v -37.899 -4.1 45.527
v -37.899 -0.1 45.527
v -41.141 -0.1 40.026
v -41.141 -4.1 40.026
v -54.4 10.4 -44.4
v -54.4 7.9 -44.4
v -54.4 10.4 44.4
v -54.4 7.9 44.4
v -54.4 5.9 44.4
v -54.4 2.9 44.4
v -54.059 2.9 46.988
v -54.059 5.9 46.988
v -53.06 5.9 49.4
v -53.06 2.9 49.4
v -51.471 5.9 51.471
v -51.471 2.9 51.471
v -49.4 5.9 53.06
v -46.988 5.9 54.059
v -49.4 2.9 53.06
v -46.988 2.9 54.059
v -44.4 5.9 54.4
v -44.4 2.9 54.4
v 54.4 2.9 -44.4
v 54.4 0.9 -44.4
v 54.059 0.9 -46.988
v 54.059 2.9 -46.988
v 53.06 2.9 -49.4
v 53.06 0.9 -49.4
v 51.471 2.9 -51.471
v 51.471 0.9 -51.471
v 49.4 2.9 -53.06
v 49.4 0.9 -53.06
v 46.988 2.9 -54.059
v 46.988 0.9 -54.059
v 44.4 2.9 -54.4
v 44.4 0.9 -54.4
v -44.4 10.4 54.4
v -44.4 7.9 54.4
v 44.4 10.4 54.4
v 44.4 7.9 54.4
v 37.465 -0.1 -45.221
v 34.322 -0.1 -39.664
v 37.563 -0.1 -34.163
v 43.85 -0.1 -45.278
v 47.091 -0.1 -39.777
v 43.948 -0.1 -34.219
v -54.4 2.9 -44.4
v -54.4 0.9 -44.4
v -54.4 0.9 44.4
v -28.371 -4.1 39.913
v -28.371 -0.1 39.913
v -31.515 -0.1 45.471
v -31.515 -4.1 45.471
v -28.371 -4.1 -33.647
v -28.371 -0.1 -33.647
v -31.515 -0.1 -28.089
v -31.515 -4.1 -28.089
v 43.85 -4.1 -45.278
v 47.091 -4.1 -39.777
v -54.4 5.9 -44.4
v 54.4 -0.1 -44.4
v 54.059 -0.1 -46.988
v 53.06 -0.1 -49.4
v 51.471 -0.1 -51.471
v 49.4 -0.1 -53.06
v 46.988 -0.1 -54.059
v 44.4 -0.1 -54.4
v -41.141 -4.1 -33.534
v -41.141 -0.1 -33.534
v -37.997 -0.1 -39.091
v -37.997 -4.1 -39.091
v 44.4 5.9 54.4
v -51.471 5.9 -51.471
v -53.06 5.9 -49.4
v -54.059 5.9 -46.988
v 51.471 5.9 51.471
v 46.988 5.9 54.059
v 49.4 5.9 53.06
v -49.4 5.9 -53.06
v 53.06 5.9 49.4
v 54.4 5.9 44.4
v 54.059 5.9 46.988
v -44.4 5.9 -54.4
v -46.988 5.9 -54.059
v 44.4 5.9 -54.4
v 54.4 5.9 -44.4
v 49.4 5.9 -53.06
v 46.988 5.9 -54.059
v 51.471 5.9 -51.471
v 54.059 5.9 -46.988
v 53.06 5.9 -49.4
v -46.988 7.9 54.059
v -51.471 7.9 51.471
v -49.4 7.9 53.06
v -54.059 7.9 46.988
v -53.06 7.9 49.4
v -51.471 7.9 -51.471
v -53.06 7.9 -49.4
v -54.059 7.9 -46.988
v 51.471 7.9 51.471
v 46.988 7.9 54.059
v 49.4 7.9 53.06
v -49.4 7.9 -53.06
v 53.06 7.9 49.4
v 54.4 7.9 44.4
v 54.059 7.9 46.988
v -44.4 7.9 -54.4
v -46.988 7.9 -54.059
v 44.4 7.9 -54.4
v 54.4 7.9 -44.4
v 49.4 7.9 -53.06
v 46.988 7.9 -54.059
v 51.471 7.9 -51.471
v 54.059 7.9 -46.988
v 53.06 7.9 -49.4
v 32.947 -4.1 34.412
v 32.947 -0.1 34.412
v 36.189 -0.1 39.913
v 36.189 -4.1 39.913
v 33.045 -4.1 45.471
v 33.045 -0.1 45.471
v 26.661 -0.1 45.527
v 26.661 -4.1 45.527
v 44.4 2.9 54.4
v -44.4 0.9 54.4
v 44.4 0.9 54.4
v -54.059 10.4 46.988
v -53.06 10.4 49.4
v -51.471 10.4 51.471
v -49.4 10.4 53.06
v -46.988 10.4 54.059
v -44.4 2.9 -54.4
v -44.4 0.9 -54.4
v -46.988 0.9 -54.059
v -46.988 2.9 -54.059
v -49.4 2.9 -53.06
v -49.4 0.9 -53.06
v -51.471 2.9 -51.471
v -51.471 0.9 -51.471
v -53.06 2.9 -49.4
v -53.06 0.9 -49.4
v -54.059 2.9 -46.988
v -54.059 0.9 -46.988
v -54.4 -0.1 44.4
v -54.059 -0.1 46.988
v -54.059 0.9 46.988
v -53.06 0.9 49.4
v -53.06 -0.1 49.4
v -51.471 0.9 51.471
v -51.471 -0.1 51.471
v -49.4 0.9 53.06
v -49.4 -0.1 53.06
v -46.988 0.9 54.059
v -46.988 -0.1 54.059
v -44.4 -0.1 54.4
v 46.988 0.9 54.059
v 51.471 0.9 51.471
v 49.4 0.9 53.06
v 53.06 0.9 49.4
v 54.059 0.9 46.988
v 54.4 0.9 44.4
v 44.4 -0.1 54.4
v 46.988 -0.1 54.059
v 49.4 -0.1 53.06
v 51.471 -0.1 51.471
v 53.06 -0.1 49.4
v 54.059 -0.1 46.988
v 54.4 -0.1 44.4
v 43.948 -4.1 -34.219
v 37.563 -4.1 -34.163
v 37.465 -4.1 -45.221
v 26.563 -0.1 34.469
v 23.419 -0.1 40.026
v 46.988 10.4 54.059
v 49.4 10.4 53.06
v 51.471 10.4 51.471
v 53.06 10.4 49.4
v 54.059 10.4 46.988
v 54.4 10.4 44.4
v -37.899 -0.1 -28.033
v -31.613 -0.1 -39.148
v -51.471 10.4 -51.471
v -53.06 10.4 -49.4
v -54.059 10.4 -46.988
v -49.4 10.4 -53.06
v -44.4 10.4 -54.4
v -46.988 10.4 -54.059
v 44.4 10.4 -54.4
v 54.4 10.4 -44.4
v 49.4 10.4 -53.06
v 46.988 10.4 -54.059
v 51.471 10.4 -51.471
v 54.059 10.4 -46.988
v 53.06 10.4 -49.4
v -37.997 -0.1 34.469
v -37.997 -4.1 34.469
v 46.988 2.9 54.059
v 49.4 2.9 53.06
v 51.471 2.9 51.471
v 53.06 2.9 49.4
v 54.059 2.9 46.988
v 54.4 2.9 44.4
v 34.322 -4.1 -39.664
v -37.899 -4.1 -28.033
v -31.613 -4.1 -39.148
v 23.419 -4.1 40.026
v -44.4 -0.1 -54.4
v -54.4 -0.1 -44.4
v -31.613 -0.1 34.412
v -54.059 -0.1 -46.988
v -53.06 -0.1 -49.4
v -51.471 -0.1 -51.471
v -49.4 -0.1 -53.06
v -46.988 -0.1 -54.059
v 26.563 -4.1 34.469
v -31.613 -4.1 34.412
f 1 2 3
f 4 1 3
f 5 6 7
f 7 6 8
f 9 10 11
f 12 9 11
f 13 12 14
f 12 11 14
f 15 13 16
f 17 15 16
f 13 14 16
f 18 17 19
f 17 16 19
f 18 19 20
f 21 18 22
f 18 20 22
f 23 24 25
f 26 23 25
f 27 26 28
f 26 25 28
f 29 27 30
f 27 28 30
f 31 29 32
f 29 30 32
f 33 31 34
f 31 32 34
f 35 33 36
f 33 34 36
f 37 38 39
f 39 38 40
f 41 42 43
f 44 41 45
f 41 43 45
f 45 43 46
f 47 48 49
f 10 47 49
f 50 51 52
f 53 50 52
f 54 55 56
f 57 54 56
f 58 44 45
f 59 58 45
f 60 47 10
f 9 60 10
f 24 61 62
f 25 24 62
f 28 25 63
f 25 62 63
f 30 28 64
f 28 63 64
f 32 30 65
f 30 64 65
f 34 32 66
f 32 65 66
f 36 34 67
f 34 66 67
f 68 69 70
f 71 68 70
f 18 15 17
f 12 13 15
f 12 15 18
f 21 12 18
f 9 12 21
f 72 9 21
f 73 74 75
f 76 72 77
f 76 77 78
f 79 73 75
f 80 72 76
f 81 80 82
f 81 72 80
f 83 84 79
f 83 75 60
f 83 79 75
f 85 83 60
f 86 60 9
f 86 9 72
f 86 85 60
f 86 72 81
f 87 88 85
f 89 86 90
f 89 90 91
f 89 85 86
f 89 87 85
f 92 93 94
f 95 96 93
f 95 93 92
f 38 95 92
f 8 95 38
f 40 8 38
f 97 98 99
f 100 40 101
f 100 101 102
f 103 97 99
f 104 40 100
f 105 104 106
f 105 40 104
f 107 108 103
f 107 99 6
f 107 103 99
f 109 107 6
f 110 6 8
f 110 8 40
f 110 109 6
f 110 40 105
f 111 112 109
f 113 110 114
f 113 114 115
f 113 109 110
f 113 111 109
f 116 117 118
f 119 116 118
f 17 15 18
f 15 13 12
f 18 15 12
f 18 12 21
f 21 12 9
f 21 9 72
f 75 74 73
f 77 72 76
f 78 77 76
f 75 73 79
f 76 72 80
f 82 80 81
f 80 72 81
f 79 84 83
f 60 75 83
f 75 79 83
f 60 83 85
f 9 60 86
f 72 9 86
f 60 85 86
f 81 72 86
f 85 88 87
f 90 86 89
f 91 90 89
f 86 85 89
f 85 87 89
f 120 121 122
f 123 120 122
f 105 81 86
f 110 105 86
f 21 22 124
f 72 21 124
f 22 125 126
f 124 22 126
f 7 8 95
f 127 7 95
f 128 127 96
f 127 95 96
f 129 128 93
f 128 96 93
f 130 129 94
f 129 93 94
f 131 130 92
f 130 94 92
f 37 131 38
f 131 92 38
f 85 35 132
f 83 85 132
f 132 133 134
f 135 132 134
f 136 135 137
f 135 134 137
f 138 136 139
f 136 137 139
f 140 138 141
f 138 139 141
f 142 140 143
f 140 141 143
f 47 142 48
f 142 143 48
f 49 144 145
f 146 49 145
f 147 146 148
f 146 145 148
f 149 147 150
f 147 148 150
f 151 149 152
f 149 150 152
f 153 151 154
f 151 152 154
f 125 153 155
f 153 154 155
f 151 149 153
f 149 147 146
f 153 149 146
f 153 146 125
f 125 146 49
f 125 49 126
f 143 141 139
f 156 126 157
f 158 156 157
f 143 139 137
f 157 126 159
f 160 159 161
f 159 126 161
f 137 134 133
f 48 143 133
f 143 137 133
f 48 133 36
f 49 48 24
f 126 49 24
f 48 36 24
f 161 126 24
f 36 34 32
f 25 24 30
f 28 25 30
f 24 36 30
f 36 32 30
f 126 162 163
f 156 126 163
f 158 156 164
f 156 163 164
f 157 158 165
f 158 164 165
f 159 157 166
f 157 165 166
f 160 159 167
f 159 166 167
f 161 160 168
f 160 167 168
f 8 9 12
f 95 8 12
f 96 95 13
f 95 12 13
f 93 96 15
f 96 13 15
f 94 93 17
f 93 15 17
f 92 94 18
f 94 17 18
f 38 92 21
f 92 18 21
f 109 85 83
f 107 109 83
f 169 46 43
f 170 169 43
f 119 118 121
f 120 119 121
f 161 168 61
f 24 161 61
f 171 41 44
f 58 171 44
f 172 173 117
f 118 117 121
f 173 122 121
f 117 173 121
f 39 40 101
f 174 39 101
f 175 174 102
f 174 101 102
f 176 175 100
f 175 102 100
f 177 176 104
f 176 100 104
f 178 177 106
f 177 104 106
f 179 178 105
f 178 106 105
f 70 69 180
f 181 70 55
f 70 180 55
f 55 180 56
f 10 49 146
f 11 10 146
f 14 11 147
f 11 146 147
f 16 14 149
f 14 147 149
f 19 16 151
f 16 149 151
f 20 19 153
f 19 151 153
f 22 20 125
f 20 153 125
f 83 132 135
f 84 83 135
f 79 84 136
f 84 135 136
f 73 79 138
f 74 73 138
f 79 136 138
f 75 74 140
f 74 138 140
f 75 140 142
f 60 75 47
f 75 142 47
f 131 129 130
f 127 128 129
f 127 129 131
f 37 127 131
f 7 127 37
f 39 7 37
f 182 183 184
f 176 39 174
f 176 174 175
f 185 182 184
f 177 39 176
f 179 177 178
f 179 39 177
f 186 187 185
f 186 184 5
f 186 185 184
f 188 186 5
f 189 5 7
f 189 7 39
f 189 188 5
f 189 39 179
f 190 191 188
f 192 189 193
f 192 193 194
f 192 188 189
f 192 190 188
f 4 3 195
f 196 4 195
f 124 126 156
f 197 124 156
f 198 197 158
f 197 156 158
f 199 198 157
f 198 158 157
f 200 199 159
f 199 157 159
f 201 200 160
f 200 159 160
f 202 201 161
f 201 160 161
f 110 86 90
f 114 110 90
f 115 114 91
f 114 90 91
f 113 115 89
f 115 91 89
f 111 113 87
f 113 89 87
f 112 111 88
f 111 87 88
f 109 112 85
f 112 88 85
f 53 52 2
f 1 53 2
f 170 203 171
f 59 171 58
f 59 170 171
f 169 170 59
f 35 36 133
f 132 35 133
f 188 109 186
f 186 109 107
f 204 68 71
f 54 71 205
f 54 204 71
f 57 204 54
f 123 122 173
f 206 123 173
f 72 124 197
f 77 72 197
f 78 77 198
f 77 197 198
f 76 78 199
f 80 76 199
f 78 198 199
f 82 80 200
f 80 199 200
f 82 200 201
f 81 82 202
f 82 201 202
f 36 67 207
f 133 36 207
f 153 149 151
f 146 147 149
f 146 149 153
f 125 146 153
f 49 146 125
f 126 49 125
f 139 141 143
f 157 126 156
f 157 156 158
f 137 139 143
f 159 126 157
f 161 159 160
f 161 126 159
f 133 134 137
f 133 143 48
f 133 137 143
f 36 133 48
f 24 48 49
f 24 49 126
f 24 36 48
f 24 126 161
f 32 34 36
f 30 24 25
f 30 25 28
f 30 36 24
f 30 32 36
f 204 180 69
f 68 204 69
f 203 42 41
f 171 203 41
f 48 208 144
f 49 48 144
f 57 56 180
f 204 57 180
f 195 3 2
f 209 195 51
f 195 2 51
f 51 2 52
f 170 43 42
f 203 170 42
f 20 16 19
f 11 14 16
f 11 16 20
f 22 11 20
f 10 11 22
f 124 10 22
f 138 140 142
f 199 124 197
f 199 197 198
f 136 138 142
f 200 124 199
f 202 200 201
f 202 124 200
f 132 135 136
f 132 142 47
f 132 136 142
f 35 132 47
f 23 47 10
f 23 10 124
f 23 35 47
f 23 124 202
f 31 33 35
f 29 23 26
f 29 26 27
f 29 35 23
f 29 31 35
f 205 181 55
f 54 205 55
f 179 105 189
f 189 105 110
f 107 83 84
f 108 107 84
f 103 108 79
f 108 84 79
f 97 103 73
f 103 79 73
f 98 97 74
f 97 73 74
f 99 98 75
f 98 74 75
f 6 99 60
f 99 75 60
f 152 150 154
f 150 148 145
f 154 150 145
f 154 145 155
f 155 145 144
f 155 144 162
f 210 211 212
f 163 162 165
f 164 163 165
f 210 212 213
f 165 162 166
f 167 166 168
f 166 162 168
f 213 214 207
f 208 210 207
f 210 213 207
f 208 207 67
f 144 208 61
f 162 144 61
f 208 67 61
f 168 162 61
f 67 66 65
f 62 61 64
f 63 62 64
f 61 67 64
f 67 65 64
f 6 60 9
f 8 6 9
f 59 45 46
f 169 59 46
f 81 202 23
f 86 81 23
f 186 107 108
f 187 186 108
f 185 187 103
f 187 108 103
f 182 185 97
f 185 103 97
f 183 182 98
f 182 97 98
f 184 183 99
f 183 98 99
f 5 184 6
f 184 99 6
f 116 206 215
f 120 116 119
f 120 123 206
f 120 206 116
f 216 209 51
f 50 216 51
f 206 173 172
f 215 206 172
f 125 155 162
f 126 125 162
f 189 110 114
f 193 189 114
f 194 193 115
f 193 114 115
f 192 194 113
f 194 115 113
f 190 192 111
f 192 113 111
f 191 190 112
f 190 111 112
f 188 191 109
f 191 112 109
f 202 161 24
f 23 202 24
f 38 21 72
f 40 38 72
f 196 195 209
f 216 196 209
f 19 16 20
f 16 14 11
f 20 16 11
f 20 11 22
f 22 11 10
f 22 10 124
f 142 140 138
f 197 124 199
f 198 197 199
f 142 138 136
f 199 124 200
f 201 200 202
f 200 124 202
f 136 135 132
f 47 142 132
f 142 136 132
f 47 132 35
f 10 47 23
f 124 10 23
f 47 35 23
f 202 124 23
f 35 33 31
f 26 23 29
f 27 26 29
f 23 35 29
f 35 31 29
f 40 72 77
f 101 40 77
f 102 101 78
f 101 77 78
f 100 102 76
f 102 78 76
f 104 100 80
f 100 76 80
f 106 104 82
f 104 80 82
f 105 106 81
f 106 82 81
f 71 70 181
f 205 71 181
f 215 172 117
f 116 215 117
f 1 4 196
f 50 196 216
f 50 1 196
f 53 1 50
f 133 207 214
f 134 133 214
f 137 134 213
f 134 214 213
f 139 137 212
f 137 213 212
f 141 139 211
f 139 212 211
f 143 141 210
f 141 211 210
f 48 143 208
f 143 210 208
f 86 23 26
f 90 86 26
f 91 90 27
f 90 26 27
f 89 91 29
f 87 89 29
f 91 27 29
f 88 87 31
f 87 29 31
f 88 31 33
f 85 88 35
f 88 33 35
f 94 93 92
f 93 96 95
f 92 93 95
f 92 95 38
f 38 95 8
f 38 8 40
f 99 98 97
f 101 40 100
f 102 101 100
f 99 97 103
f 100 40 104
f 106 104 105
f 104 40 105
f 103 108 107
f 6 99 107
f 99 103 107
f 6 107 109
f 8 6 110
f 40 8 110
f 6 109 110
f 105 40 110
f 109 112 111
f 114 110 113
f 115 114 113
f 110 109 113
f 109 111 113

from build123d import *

# Parameters (mm, degrees)
BOSS_EXTRUDE1_DEPTH   = 0.1
BOSS_EXTRUDE2_START   = -0.1
BOSS_EXTRUDE2_DEPTH   = 1
BOSS_EXTRUDE3_DEPTH   = 4
BOSS_EXTRUDE3_2_DEPTH = 4
BOSS_EXTRUDE3_3_DEPTH = 4
BOSS_EXTRUDE3_4_DEPTH = 4
BOSS_EXTRUDE4_DEPTH   = 2
BOSS_EXTRUDE5_START   = 2
BOSS_EXTRUDE5_DEPTH   = 3
BOSS_EXTRUDE6_START   = 5
BOSS_EXTRUDE6_DEPTH   = 2
BOSS_EXTRUDE7_START   = 7
BOSS_EXTRUDE7_DEPTH   = 2.5


with BuildPart() as part:
    # Sketch2 → Boss-Extrude1 (new body)
    with BuildSketch(Plane(origin=(0, 0, 0), x_dir=(1, 0, 0), z_dir=(0, 1, 0))):
        with BuildLine():
            Line((44.4, 52.9), (-44.4, 52.9))
            ThreePointArc((-44.4, 52.9), (-50.41040764, 50.41040764), (-52.9, 44.4))
            Line((-52.9, 44.4), (-52.9, -44.4))
            ThreePointArc((-52.9, -44.4), (-50.41040764, -50.41040764), (-44.4, -52.9))
            Line((-44.4, -52.9), (44.4, -52.9))
            ThreePointArc((44.4, -52.9), (50.41040764, -50.41040764), (52.9, -44.4))
            Line((52.9, -44.4), (52.9, 44.4))
            ThreePointArc((52.9, 44.4), (50.41040764, 50.41040764), (44.4, 52.9))
        make_face()
        with BuildLine():
            Line((44.4, 51.9), (-44.4, 51.9))
            ThreePointArc((-44.4, 51.9), (-49.703300859, 49.703300859), (-51.9, 44.4))
            Line((-51.9, 44.4), (-51.9, -44.4))
            ThreePointArc((-51.9, -44.4), (-49.703300859, -49.703300859), (-44.4, -51.9))
            Line((-44.4, -51.9), (44.4, -51.9))
            ThreePointArc((44.4, -51.9), (49.703300859, -49.703300859), (51.9, -44.4))
            Line((51.9, -44.4), (51.9, 44.4))
            ThreePointArc((51.9, 44.4), (49.703300859, 49.703300859), (44.4, 51.9))
        make_face(mode=Mode.SUBTRACT)
    extrude(amount=-BOSS_EXTRUDE1_DEPTH)

    # Sketch1 → Boss-Extrude2 (add)
    with BuildSketch(Plane(origin=(0, 0, 0), x_dir=(1, 0, 0), z_dir=(0, 1, 0)).offset(BOSS_EXTRUDE2_START)):
        with BuildLine():
            Line((54.4, -44.4), (54.4, 44.4))
            ThreePointArc((54.4, 44.4), (51.471067812, 51.471067812), (44.4, 54.4))
            Line((44.4, 54.4), (-44.4, 54.4))
            ThreePointArc((-44.4, 54.4), (-51.471067812, 51.471067812), (-54.4, 44.4))
            Line((-54.4, 44.4), (-54.4, -44.4))
            ThreePointArc((-54.4, -44.4), (-51.471067812, -51.471067812), (-44.4, -54.4))
            Line((-44.4, -54.4), (44.4, -54.4))
            ThreePointArc((44.4, -54.4), (51.471067812, -51.471067812), (54.4, -44.4))
        make_face()
        with BuildLine():
            ThreePointArc((-44.4, 53.4), (-50.763961031, 50.763961031), (-53.4, 44.4))
            Line((-53.4, 44.4), (-53.4, -44.4))
            ThreePointArc((-53.4, -44.4), (-50.763961031, -50.763961031), (-44.4, -53.4))
            Line((-44.4, -53.4), (44.4, -53.4))
            ThreePointArc((44.4, -53.4), (50.763961031, -50.763961031), (53.4, -44.4))
            Line((53.4, -44.4), (53.4, 44.4))
            ThreePointArc((53.4, 44.4), (50.763961031, 50.763961031), (44.4, 53.4))
            Line((44.4, 53.4), (-44.4, 53.4))
        make_face(mode=Mode.SUBTRACT)
        with BuildLine():
            Line((-44.4, 53.4), (44.4, 53.4))
            ThreePointArc((44.4, 53.4), (50.763961031, 50.763961031), (53.4, 44.4))
            Line((53.4, 44.4), (53.4, -44.4))
            ThreePointArc((53.4, -44.4), (50.763961031, -50.763961031), (44.4, -53.4))
            Line((44.4, -53.4), (-44.4, -53.4))
            ThreePointArc((-44.4, -53.4), (-50.763961031, -50.763961031), (-53.4, -44.4))
            Line((-53.4, -44.4), (-53.4, 44.4))
            ThreePointArc((-53.4, 44.4), (-50.763961031, 50.763961031), (-44.4, 53.4))
        make_face()
    extrude(amount=BOSS_EXTRUDE2_DEPTH)


with BuildPart() as body_2:
    # Sketch3 → Boss-Extrude3 (new body)
    with BuildSketch(Plane.XZ.offset(0.1)):
        Polygon((-41.140539781, 40.026118716), (-37.997071749, 34.468775471), (-31.612537306, 34.41242702), (-28.371470895, 39.913421814), (-31.514938926, 45.470765058), (-37.899473369, 45.527113509), align=None)
    extrude(amount=BOSS_EXTRUDE3_DEPTH)


with BuildPart() as body_3:
    # Sketch3 → Boss-Extrude3 2 (new body)
    with BuildSketch(Plane.XZ.offset(0.1)):
        Polygon((23.419460219, 40.026118716), (26.56292825, 34.468775471), (32.947462693, 34.41242702), (36.188529105, 39.913421814), (33.045061073, 45.470765058), (26.66052663, 45.527113509), align=None)
    extrude(amount=BOSS_EXTRUDE3_2_DEPTH)


with BuildPart() as body_4:
    # Sketch3 → Boss-Extrude3 3 (new body)
    with BuildSketch(Plane.XZ.offset(0.1)):
        Polygon((34.321988768, -39.663881284), (37.4654568, -45.221224529), (43.849991243, -45.27757298), (47.091057654, -39.776578186), (43.947589623, -34.219234942), (37.56305518, -34.162886491), align=None)
    extrude(amount=BOSS_EXTRUDE3_3_DEPTH)


with BuildPart() as body_5:
    # Sketch3 → Boss-Extrude3 4 (new body)
    with BuildSketch(Plane.XZ.offset(0.1)):
        Polygon((-41.140539781, -33.533881284), (-37.997071749, -39.091224529), (-31.612537306, -39.14757298), (-28.371470895, -33.646578186), (-31.514938926, -28.089234942), (-37.899473369, -28.032886491), align=None)
    extrude(amount=BOSS_EXTRUDE3_4_DEPTH)


with BuildPart() as body_6:
    # Sketch4 → Boss-Extrude4 (new body)
    with BuildSketch(Plane(origin=(0, 0.9, 0), x_dir=(1, 0, 0), z_dir=(0, 1, 0))):
        with BuildLine():
            Line((54.4, -44.4), (54.4, 44.4))
            ThreePointArc((54.4, 44.4), (51.471067812, 51.471067812), (44.4, 54.4))
            Line((44.4, 54.4), (-44.4, 54.4))
            ThreePointArc((-44.4, 54.4), (-51.471067812, 51.471067812), (-54.4, 44.4))
            Line((-54.4, 44.4), (-54.4, -44.4))
            ThreePointArc((-54.4, -44.4), (-51.471067812, -51.471067812), (-44.4, -54.4))
            Line((-44.4, -54.4), (44.4, -54.4))
            ThreePointArc((44.4, -54.4), (51.471067812, -51.471067812), (54.4, -44.4))
        make_face()
    extrude(amount=BOSS_EXTRUDE4_DEPTH)


with BuildPart() as body_7:
    # Sketch4<2> → Boss-Extrude5 (new body)
    with BuildSketch(Plane(origin=(0, 0.9, 0), x_dir=(1, 0, 0), z_dir=(0, 1, 0)).offset(BOSS_EXTRUDE5_START)):
        with BuildLine():
            Line((54.4, -44.4), (54.4, 44.4))
            ThreePointArc((54.4, 44.4), (51.471067812, 51.471067812), (44.4, 54.4))
            Line((44.4, 54.4), (-44.4, 54.4))
            ThreePointArc((-44.4, 54.4), (-51.471067812, 51.471067812), (-54.4, 44.4))
            Line((-54.4, 44.4), (-54.4, -44.4))
            ThreePointArc((-54.4, -44.4), (-51.471067812, -51.471067812), (-44.4, -54.4))
            Line((-44.4, -54.4), (44.4, -54.4))
            ThreePointArc((44.4, -54.4), (51.471067812, -51.471067812), (54.4, -44.4))
        make_face()
    extrude(amount=BOSS_EXTRUDE5_DEPTH)


with BuildPart() as body_8:
    # Sketch4<3> → Boss-Extrude6 (new body)
    with BuildSketch(Plane(origin=(0, 0.9, 0), x_dir=(1, 0, 0), z_dir=(0, 1, 0)).offset(BOSS_EXTRUDE6_START)):
        with BuildLine():
            Line((54.4, -44.4), (54.4, 44.4))
            ThreePointArc((54.4, 44.4), (51.471067812, 51.471067812), (44.4, 54.4))
            Line((44.4, 54.4), (-44.4, 54.4))
            ThreePointArc((-44.4, 54.4), (-51.471067812, 51.471067812), (-54.4, 44.4))
            Line((-54.4, 44.4), (-54.4, -44.4))
            ThreePointArc((-54.4, -44.4), (-51.471067812, -51.471067812), (-44.4, -54.4))
            Line((-44.4, -54.4), (44.4, -54.4))
            ThreePointArc((44.4, -54.4), (51.471067812, -51.471067812), (54.4, -44.4))
        make_face()
    extrude(amount=BOSS_EXTRUDE6_DEPTH)


with BuildPart() as body_9:
    # Sketch4<4> → Boss-Extrude7 (new body)
    with BuildSketch(Plane(origin=(0, 0.9, 0), x_dir=(1, 0, 0), z_dir=(0, 1, 0)).offset(BOSS_EXTRUDE7_START)):
        with BuildLine():
            Line((54.4, -44.4), (54.4, 44.4))
            ThreePointArc((54.4, 44.4), (51.471067812, 51.471067812), (44.4, 54.4))
            Line((44.4, 54.4), (-44.4, 54.4))
            ThreePointArc((-44.4, 54.4), (-51.471067812, 51.471067812), (-54.4, 44.4))
            Line((-54.4, 44.4), (-54.4, -44.4))
            ThreePointArc((-54.4, -44.4), (-51.471067812, -51.471067812), (-44.4, -54.4))
            Line((-44.4, -54.4), (44.4, -54.4))
            ThreePointArc((44.4, -54.4), (51.471067812, -51.471067812), (54.4, -44.4))
        make_face()
    extrude(amount=BOSS_EXTRUDE7_DEPTH)


solid = Compound([part.part, body_2.part, body_3.part, body_4.part, body_5.part, body_6.part, body_7.part, body_8.part, body_9.part])
